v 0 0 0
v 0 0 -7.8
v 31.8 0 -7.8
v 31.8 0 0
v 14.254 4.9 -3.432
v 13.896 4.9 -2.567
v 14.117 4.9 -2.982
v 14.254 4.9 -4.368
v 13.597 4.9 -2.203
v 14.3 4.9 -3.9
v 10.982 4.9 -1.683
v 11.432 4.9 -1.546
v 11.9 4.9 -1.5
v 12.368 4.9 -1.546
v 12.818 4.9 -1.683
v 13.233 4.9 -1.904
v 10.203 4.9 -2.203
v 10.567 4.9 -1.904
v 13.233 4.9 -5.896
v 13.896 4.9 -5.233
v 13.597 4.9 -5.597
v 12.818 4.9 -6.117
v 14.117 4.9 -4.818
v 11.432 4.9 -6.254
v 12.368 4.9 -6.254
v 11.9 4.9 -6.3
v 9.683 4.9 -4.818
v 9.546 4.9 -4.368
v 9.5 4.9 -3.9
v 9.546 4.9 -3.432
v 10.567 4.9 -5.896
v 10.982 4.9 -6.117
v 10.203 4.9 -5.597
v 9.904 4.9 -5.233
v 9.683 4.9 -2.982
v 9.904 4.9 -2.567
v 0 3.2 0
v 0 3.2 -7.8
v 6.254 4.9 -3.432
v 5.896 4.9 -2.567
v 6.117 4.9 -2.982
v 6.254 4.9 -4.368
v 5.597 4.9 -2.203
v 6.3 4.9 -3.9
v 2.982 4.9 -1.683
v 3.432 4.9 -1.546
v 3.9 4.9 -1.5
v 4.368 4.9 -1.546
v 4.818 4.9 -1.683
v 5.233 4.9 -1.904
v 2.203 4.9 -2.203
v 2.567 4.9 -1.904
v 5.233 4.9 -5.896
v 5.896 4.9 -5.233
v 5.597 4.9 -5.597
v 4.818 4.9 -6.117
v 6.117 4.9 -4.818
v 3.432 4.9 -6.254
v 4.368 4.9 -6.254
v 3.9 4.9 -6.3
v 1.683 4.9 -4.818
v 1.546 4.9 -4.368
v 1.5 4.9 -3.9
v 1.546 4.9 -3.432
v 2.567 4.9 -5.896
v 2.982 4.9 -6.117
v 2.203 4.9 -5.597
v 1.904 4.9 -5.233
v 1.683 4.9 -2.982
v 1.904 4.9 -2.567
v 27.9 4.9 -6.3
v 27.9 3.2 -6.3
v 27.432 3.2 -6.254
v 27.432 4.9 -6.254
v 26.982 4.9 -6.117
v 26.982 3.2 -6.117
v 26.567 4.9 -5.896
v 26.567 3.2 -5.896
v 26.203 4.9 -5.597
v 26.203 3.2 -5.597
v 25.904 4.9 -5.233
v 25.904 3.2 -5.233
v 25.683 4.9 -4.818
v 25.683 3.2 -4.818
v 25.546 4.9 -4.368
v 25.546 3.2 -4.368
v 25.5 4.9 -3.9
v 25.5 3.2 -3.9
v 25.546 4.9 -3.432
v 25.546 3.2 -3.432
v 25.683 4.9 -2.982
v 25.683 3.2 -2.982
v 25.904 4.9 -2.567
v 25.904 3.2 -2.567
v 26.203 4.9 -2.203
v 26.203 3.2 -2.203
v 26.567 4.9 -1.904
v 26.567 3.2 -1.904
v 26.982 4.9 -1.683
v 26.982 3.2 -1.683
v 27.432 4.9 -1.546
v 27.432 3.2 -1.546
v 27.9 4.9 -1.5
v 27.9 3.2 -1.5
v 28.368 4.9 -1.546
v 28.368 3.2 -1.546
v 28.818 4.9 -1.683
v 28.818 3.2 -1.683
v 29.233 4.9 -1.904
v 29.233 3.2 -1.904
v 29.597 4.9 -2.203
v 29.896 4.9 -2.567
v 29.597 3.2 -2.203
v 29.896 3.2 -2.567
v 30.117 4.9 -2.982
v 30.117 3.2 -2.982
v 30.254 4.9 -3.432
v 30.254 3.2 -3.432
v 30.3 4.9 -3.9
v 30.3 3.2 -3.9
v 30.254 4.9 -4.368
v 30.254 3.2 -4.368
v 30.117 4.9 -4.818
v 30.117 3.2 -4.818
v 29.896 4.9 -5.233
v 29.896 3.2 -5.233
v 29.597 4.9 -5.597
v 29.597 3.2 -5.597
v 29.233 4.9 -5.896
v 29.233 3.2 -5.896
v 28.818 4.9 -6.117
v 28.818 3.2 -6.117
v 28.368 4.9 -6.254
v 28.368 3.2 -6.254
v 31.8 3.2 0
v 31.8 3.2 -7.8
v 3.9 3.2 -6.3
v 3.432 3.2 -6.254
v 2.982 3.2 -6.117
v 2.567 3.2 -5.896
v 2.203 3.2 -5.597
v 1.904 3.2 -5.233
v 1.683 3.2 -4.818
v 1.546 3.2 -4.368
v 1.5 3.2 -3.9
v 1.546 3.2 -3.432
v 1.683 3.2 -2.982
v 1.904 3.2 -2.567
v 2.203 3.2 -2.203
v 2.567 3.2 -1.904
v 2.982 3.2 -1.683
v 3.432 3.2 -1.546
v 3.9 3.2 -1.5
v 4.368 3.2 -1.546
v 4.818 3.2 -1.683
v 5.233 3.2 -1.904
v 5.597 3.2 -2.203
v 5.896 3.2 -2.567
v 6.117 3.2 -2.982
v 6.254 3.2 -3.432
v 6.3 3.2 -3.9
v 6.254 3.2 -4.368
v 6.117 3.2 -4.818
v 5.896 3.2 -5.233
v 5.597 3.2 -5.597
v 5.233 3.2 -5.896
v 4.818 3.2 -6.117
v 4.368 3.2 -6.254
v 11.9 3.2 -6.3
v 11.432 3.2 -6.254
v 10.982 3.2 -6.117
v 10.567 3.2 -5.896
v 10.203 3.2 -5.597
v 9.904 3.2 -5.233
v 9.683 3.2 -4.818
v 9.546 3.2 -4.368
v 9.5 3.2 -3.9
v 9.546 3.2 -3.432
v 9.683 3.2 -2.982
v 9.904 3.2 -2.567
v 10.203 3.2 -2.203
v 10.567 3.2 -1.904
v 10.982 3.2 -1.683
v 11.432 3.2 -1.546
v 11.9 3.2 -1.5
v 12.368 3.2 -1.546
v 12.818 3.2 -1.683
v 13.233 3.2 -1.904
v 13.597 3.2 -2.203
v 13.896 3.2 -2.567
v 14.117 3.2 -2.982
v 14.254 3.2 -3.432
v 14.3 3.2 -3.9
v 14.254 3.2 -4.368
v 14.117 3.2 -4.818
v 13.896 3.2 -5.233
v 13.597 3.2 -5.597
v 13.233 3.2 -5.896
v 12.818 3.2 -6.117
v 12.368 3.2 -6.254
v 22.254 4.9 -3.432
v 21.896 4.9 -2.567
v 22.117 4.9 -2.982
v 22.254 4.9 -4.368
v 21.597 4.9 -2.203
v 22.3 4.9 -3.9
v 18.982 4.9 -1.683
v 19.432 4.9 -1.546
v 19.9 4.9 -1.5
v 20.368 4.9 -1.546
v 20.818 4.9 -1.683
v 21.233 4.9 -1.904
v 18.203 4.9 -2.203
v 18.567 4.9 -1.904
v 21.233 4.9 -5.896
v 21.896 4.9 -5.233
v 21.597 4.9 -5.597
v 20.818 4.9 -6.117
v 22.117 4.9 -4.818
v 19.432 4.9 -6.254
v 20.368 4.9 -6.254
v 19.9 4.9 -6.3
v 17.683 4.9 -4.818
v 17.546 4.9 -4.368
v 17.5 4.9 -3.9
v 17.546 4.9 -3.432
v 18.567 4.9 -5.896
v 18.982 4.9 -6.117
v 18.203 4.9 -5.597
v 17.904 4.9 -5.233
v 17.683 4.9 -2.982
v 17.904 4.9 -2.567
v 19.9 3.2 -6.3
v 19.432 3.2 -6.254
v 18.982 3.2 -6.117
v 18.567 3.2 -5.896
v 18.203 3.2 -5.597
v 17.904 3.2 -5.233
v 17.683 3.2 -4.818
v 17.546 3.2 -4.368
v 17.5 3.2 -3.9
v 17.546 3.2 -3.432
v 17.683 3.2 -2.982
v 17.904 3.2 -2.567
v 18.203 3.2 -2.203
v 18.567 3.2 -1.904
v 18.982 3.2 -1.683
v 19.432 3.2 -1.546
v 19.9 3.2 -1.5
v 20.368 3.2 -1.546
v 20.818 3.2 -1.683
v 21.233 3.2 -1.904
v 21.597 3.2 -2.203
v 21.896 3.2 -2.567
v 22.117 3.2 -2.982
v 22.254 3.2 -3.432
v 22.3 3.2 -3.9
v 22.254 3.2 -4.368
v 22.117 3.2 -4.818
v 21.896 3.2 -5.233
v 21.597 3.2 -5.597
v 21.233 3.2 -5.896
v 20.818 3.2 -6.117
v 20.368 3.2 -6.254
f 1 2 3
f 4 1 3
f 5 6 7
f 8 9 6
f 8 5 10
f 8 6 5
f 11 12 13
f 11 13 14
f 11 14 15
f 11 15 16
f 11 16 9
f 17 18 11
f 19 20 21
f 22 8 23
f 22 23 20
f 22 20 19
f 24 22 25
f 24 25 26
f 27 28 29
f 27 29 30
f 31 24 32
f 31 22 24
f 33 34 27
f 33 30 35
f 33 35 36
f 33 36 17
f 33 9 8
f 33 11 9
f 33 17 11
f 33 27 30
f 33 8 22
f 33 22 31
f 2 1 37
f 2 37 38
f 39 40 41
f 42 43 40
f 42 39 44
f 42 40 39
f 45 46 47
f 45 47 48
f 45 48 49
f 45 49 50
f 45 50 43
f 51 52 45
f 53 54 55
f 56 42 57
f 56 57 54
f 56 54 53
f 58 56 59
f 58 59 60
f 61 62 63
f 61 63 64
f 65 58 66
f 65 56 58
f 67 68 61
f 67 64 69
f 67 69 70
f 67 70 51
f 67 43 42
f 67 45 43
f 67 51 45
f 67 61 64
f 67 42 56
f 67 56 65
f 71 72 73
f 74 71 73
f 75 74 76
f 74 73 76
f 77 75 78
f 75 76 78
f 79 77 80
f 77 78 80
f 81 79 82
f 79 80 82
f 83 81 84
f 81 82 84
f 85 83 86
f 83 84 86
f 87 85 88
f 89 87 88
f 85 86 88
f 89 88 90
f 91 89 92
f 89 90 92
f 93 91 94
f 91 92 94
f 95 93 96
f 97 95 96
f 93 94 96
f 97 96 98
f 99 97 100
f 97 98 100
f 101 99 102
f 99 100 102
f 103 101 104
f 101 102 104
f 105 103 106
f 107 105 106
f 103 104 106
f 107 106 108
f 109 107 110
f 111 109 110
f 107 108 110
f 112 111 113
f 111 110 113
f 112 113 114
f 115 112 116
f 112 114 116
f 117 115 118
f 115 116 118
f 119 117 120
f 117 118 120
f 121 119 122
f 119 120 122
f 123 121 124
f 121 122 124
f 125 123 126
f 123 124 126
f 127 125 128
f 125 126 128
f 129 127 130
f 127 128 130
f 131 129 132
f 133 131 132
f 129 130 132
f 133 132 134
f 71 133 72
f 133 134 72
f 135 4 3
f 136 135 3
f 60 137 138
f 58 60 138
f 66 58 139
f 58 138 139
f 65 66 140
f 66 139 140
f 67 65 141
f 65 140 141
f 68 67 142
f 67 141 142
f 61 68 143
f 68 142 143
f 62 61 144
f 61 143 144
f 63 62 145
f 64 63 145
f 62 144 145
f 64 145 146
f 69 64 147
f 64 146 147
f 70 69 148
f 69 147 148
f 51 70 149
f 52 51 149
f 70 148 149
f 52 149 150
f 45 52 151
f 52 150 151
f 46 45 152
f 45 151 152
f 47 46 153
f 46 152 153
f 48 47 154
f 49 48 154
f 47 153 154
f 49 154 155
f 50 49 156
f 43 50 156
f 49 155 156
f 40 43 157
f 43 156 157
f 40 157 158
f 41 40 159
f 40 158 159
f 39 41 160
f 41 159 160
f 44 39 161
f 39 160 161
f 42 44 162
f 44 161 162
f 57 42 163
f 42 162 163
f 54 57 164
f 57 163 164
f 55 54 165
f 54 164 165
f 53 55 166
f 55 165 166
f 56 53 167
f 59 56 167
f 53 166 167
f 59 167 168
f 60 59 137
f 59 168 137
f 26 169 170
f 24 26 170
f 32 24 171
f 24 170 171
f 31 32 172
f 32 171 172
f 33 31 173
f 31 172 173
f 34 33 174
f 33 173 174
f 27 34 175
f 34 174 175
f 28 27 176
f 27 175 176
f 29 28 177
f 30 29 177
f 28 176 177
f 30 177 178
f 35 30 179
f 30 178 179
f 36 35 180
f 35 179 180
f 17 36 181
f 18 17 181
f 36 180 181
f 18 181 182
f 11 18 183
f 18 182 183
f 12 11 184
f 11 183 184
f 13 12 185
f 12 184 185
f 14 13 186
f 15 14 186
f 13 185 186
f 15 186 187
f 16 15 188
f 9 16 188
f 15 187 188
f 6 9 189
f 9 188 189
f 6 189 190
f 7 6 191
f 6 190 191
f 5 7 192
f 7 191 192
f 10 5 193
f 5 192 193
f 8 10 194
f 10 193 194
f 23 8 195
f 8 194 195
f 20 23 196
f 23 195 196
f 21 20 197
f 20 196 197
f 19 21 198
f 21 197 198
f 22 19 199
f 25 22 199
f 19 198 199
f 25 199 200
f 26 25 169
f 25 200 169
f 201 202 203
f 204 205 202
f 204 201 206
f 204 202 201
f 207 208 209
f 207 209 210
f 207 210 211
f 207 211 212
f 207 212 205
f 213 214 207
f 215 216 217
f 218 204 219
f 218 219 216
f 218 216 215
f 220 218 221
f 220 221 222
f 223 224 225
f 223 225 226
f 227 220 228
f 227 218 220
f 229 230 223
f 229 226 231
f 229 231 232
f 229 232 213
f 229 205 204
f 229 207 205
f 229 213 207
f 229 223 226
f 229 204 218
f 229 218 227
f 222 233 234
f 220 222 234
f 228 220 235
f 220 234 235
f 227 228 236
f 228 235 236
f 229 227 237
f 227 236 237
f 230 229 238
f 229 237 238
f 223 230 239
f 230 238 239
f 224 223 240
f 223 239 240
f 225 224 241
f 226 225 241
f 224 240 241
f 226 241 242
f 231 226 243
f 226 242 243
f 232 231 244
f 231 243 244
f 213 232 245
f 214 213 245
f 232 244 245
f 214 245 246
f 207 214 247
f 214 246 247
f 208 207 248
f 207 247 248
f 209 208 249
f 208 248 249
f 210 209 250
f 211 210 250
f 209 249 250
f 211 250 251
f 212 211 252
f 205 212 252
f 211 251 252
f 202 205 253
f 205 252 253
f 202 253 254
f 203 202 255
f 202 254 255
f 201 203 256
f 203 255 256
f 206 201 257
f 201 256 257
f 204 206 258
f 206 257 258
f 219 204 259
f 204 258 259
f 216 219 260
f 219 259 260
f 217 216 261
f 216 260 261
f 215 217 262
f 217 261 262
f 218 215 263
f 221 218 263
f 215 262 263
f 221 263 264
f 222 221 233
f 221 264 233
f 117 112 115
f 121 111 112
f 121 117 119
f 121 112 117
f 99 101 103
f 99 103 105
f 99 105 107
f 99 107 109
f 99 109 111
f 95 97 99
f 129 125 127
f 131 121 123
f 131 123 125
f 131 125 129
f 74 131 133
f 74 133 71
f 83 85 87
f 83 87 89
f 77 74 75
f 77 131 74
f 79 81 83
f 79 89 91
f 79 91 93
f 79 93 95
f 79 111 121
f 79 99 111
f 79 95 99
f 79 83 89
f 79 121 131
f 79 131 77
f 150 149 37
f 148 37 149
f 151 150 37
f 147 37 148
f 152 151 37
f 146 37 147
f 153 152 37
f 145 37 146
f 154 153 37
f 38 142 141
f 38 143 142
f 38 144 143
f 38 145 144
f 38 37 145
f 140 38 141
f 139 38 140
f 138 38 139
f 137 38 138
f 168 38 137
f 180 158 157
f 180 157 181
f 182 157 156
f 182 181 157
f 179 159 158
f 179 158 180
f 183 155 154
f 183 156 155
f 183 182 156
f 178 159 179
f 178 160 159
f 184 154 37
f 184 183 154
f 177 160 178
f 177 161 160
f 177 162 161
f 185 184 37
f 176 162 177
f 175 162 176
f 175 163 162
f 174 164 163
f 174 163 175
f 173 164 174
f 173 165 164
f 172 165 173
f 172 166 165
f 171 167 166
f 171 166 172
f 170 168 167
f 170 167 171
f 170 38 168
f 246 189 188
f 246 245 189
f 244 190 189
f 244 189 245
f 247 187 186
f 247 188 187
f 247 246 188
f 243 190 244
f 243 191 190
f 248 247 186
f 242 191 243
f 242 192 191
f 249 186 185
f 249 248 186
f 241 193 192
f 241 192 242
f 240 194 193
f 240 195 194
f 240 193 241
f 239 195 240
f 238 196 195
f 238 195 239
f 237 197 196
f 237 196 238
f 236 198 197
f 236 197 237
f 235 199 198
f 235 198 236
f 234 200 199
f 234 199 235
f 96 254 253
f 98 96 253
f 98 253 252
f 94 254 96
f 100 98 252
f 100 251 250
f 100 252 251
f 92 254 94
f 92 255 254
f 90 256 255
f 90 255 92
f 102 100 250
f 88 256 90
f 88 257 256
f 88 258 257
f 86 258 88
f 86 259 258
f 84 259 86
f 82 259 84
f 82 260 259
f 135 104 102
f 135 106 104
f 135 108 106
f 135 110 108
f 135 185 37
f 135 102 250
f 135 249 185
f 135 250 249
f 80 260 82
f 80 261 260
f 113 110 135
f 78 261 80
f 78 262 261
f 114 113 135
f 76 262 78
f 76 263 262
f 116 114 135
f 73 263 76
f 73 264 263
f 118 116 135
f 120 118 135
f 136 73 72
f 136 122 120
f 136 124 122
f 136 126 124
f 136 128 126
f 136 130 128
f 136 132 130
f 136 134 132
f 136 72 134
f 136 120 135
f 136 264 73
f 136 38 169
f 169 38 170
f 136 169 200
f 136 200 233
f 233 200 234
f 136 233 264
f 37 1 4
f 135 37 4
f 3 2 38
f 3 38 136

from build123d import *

# Parameters (mm, degrees)
BASE_SKETCH_W    = 31.8
BASE_SKETCH_H    = 7.8
BASE_BRICK_DEPTH = 3.2
CIRCLE_SKETCH_R  = 2.4
CIRCLE_DEPTH     = 1.7
LPATTERN1_COUNT  = 4
LPATTERN1_PITCH  = 8


with BuildPart() as part:
    # Base_Sketch → Base_Brick (new body)
    with BuildSketch(Plane(origin=(0, 0, 0), x_dir=(1, 0, 0), z_dir=(0, 1, 0))):
        with Locations((15.9, 3.9)):
            Rectangle(BASE_SKETCH_W, BASE_SKETCH_H)
    extrude(amount=BASE_BRICK_DEPTH)

    # Circle_Sketch → Circle (add)
    with BuildSketch(Plane(origin=(0, 3.2, 0), x_dir=(1, 0, 0), z_dir=(0, 1, 0))):
        with Locations(Location((3.9, 3.9, 0), (0, 0, 90))):
            Circle(CIRCLE_SKETCH_R)
    circle = extrude(amount=CIRCLE_DEPTH)

    # LPattern1: Circle ×4
    with Locations(*[(i * LPATTERN1_PITCH, 0, 0) for i in range(1, LPATTERN1_COUNT)]):
        add(circle)


solid = part.part
